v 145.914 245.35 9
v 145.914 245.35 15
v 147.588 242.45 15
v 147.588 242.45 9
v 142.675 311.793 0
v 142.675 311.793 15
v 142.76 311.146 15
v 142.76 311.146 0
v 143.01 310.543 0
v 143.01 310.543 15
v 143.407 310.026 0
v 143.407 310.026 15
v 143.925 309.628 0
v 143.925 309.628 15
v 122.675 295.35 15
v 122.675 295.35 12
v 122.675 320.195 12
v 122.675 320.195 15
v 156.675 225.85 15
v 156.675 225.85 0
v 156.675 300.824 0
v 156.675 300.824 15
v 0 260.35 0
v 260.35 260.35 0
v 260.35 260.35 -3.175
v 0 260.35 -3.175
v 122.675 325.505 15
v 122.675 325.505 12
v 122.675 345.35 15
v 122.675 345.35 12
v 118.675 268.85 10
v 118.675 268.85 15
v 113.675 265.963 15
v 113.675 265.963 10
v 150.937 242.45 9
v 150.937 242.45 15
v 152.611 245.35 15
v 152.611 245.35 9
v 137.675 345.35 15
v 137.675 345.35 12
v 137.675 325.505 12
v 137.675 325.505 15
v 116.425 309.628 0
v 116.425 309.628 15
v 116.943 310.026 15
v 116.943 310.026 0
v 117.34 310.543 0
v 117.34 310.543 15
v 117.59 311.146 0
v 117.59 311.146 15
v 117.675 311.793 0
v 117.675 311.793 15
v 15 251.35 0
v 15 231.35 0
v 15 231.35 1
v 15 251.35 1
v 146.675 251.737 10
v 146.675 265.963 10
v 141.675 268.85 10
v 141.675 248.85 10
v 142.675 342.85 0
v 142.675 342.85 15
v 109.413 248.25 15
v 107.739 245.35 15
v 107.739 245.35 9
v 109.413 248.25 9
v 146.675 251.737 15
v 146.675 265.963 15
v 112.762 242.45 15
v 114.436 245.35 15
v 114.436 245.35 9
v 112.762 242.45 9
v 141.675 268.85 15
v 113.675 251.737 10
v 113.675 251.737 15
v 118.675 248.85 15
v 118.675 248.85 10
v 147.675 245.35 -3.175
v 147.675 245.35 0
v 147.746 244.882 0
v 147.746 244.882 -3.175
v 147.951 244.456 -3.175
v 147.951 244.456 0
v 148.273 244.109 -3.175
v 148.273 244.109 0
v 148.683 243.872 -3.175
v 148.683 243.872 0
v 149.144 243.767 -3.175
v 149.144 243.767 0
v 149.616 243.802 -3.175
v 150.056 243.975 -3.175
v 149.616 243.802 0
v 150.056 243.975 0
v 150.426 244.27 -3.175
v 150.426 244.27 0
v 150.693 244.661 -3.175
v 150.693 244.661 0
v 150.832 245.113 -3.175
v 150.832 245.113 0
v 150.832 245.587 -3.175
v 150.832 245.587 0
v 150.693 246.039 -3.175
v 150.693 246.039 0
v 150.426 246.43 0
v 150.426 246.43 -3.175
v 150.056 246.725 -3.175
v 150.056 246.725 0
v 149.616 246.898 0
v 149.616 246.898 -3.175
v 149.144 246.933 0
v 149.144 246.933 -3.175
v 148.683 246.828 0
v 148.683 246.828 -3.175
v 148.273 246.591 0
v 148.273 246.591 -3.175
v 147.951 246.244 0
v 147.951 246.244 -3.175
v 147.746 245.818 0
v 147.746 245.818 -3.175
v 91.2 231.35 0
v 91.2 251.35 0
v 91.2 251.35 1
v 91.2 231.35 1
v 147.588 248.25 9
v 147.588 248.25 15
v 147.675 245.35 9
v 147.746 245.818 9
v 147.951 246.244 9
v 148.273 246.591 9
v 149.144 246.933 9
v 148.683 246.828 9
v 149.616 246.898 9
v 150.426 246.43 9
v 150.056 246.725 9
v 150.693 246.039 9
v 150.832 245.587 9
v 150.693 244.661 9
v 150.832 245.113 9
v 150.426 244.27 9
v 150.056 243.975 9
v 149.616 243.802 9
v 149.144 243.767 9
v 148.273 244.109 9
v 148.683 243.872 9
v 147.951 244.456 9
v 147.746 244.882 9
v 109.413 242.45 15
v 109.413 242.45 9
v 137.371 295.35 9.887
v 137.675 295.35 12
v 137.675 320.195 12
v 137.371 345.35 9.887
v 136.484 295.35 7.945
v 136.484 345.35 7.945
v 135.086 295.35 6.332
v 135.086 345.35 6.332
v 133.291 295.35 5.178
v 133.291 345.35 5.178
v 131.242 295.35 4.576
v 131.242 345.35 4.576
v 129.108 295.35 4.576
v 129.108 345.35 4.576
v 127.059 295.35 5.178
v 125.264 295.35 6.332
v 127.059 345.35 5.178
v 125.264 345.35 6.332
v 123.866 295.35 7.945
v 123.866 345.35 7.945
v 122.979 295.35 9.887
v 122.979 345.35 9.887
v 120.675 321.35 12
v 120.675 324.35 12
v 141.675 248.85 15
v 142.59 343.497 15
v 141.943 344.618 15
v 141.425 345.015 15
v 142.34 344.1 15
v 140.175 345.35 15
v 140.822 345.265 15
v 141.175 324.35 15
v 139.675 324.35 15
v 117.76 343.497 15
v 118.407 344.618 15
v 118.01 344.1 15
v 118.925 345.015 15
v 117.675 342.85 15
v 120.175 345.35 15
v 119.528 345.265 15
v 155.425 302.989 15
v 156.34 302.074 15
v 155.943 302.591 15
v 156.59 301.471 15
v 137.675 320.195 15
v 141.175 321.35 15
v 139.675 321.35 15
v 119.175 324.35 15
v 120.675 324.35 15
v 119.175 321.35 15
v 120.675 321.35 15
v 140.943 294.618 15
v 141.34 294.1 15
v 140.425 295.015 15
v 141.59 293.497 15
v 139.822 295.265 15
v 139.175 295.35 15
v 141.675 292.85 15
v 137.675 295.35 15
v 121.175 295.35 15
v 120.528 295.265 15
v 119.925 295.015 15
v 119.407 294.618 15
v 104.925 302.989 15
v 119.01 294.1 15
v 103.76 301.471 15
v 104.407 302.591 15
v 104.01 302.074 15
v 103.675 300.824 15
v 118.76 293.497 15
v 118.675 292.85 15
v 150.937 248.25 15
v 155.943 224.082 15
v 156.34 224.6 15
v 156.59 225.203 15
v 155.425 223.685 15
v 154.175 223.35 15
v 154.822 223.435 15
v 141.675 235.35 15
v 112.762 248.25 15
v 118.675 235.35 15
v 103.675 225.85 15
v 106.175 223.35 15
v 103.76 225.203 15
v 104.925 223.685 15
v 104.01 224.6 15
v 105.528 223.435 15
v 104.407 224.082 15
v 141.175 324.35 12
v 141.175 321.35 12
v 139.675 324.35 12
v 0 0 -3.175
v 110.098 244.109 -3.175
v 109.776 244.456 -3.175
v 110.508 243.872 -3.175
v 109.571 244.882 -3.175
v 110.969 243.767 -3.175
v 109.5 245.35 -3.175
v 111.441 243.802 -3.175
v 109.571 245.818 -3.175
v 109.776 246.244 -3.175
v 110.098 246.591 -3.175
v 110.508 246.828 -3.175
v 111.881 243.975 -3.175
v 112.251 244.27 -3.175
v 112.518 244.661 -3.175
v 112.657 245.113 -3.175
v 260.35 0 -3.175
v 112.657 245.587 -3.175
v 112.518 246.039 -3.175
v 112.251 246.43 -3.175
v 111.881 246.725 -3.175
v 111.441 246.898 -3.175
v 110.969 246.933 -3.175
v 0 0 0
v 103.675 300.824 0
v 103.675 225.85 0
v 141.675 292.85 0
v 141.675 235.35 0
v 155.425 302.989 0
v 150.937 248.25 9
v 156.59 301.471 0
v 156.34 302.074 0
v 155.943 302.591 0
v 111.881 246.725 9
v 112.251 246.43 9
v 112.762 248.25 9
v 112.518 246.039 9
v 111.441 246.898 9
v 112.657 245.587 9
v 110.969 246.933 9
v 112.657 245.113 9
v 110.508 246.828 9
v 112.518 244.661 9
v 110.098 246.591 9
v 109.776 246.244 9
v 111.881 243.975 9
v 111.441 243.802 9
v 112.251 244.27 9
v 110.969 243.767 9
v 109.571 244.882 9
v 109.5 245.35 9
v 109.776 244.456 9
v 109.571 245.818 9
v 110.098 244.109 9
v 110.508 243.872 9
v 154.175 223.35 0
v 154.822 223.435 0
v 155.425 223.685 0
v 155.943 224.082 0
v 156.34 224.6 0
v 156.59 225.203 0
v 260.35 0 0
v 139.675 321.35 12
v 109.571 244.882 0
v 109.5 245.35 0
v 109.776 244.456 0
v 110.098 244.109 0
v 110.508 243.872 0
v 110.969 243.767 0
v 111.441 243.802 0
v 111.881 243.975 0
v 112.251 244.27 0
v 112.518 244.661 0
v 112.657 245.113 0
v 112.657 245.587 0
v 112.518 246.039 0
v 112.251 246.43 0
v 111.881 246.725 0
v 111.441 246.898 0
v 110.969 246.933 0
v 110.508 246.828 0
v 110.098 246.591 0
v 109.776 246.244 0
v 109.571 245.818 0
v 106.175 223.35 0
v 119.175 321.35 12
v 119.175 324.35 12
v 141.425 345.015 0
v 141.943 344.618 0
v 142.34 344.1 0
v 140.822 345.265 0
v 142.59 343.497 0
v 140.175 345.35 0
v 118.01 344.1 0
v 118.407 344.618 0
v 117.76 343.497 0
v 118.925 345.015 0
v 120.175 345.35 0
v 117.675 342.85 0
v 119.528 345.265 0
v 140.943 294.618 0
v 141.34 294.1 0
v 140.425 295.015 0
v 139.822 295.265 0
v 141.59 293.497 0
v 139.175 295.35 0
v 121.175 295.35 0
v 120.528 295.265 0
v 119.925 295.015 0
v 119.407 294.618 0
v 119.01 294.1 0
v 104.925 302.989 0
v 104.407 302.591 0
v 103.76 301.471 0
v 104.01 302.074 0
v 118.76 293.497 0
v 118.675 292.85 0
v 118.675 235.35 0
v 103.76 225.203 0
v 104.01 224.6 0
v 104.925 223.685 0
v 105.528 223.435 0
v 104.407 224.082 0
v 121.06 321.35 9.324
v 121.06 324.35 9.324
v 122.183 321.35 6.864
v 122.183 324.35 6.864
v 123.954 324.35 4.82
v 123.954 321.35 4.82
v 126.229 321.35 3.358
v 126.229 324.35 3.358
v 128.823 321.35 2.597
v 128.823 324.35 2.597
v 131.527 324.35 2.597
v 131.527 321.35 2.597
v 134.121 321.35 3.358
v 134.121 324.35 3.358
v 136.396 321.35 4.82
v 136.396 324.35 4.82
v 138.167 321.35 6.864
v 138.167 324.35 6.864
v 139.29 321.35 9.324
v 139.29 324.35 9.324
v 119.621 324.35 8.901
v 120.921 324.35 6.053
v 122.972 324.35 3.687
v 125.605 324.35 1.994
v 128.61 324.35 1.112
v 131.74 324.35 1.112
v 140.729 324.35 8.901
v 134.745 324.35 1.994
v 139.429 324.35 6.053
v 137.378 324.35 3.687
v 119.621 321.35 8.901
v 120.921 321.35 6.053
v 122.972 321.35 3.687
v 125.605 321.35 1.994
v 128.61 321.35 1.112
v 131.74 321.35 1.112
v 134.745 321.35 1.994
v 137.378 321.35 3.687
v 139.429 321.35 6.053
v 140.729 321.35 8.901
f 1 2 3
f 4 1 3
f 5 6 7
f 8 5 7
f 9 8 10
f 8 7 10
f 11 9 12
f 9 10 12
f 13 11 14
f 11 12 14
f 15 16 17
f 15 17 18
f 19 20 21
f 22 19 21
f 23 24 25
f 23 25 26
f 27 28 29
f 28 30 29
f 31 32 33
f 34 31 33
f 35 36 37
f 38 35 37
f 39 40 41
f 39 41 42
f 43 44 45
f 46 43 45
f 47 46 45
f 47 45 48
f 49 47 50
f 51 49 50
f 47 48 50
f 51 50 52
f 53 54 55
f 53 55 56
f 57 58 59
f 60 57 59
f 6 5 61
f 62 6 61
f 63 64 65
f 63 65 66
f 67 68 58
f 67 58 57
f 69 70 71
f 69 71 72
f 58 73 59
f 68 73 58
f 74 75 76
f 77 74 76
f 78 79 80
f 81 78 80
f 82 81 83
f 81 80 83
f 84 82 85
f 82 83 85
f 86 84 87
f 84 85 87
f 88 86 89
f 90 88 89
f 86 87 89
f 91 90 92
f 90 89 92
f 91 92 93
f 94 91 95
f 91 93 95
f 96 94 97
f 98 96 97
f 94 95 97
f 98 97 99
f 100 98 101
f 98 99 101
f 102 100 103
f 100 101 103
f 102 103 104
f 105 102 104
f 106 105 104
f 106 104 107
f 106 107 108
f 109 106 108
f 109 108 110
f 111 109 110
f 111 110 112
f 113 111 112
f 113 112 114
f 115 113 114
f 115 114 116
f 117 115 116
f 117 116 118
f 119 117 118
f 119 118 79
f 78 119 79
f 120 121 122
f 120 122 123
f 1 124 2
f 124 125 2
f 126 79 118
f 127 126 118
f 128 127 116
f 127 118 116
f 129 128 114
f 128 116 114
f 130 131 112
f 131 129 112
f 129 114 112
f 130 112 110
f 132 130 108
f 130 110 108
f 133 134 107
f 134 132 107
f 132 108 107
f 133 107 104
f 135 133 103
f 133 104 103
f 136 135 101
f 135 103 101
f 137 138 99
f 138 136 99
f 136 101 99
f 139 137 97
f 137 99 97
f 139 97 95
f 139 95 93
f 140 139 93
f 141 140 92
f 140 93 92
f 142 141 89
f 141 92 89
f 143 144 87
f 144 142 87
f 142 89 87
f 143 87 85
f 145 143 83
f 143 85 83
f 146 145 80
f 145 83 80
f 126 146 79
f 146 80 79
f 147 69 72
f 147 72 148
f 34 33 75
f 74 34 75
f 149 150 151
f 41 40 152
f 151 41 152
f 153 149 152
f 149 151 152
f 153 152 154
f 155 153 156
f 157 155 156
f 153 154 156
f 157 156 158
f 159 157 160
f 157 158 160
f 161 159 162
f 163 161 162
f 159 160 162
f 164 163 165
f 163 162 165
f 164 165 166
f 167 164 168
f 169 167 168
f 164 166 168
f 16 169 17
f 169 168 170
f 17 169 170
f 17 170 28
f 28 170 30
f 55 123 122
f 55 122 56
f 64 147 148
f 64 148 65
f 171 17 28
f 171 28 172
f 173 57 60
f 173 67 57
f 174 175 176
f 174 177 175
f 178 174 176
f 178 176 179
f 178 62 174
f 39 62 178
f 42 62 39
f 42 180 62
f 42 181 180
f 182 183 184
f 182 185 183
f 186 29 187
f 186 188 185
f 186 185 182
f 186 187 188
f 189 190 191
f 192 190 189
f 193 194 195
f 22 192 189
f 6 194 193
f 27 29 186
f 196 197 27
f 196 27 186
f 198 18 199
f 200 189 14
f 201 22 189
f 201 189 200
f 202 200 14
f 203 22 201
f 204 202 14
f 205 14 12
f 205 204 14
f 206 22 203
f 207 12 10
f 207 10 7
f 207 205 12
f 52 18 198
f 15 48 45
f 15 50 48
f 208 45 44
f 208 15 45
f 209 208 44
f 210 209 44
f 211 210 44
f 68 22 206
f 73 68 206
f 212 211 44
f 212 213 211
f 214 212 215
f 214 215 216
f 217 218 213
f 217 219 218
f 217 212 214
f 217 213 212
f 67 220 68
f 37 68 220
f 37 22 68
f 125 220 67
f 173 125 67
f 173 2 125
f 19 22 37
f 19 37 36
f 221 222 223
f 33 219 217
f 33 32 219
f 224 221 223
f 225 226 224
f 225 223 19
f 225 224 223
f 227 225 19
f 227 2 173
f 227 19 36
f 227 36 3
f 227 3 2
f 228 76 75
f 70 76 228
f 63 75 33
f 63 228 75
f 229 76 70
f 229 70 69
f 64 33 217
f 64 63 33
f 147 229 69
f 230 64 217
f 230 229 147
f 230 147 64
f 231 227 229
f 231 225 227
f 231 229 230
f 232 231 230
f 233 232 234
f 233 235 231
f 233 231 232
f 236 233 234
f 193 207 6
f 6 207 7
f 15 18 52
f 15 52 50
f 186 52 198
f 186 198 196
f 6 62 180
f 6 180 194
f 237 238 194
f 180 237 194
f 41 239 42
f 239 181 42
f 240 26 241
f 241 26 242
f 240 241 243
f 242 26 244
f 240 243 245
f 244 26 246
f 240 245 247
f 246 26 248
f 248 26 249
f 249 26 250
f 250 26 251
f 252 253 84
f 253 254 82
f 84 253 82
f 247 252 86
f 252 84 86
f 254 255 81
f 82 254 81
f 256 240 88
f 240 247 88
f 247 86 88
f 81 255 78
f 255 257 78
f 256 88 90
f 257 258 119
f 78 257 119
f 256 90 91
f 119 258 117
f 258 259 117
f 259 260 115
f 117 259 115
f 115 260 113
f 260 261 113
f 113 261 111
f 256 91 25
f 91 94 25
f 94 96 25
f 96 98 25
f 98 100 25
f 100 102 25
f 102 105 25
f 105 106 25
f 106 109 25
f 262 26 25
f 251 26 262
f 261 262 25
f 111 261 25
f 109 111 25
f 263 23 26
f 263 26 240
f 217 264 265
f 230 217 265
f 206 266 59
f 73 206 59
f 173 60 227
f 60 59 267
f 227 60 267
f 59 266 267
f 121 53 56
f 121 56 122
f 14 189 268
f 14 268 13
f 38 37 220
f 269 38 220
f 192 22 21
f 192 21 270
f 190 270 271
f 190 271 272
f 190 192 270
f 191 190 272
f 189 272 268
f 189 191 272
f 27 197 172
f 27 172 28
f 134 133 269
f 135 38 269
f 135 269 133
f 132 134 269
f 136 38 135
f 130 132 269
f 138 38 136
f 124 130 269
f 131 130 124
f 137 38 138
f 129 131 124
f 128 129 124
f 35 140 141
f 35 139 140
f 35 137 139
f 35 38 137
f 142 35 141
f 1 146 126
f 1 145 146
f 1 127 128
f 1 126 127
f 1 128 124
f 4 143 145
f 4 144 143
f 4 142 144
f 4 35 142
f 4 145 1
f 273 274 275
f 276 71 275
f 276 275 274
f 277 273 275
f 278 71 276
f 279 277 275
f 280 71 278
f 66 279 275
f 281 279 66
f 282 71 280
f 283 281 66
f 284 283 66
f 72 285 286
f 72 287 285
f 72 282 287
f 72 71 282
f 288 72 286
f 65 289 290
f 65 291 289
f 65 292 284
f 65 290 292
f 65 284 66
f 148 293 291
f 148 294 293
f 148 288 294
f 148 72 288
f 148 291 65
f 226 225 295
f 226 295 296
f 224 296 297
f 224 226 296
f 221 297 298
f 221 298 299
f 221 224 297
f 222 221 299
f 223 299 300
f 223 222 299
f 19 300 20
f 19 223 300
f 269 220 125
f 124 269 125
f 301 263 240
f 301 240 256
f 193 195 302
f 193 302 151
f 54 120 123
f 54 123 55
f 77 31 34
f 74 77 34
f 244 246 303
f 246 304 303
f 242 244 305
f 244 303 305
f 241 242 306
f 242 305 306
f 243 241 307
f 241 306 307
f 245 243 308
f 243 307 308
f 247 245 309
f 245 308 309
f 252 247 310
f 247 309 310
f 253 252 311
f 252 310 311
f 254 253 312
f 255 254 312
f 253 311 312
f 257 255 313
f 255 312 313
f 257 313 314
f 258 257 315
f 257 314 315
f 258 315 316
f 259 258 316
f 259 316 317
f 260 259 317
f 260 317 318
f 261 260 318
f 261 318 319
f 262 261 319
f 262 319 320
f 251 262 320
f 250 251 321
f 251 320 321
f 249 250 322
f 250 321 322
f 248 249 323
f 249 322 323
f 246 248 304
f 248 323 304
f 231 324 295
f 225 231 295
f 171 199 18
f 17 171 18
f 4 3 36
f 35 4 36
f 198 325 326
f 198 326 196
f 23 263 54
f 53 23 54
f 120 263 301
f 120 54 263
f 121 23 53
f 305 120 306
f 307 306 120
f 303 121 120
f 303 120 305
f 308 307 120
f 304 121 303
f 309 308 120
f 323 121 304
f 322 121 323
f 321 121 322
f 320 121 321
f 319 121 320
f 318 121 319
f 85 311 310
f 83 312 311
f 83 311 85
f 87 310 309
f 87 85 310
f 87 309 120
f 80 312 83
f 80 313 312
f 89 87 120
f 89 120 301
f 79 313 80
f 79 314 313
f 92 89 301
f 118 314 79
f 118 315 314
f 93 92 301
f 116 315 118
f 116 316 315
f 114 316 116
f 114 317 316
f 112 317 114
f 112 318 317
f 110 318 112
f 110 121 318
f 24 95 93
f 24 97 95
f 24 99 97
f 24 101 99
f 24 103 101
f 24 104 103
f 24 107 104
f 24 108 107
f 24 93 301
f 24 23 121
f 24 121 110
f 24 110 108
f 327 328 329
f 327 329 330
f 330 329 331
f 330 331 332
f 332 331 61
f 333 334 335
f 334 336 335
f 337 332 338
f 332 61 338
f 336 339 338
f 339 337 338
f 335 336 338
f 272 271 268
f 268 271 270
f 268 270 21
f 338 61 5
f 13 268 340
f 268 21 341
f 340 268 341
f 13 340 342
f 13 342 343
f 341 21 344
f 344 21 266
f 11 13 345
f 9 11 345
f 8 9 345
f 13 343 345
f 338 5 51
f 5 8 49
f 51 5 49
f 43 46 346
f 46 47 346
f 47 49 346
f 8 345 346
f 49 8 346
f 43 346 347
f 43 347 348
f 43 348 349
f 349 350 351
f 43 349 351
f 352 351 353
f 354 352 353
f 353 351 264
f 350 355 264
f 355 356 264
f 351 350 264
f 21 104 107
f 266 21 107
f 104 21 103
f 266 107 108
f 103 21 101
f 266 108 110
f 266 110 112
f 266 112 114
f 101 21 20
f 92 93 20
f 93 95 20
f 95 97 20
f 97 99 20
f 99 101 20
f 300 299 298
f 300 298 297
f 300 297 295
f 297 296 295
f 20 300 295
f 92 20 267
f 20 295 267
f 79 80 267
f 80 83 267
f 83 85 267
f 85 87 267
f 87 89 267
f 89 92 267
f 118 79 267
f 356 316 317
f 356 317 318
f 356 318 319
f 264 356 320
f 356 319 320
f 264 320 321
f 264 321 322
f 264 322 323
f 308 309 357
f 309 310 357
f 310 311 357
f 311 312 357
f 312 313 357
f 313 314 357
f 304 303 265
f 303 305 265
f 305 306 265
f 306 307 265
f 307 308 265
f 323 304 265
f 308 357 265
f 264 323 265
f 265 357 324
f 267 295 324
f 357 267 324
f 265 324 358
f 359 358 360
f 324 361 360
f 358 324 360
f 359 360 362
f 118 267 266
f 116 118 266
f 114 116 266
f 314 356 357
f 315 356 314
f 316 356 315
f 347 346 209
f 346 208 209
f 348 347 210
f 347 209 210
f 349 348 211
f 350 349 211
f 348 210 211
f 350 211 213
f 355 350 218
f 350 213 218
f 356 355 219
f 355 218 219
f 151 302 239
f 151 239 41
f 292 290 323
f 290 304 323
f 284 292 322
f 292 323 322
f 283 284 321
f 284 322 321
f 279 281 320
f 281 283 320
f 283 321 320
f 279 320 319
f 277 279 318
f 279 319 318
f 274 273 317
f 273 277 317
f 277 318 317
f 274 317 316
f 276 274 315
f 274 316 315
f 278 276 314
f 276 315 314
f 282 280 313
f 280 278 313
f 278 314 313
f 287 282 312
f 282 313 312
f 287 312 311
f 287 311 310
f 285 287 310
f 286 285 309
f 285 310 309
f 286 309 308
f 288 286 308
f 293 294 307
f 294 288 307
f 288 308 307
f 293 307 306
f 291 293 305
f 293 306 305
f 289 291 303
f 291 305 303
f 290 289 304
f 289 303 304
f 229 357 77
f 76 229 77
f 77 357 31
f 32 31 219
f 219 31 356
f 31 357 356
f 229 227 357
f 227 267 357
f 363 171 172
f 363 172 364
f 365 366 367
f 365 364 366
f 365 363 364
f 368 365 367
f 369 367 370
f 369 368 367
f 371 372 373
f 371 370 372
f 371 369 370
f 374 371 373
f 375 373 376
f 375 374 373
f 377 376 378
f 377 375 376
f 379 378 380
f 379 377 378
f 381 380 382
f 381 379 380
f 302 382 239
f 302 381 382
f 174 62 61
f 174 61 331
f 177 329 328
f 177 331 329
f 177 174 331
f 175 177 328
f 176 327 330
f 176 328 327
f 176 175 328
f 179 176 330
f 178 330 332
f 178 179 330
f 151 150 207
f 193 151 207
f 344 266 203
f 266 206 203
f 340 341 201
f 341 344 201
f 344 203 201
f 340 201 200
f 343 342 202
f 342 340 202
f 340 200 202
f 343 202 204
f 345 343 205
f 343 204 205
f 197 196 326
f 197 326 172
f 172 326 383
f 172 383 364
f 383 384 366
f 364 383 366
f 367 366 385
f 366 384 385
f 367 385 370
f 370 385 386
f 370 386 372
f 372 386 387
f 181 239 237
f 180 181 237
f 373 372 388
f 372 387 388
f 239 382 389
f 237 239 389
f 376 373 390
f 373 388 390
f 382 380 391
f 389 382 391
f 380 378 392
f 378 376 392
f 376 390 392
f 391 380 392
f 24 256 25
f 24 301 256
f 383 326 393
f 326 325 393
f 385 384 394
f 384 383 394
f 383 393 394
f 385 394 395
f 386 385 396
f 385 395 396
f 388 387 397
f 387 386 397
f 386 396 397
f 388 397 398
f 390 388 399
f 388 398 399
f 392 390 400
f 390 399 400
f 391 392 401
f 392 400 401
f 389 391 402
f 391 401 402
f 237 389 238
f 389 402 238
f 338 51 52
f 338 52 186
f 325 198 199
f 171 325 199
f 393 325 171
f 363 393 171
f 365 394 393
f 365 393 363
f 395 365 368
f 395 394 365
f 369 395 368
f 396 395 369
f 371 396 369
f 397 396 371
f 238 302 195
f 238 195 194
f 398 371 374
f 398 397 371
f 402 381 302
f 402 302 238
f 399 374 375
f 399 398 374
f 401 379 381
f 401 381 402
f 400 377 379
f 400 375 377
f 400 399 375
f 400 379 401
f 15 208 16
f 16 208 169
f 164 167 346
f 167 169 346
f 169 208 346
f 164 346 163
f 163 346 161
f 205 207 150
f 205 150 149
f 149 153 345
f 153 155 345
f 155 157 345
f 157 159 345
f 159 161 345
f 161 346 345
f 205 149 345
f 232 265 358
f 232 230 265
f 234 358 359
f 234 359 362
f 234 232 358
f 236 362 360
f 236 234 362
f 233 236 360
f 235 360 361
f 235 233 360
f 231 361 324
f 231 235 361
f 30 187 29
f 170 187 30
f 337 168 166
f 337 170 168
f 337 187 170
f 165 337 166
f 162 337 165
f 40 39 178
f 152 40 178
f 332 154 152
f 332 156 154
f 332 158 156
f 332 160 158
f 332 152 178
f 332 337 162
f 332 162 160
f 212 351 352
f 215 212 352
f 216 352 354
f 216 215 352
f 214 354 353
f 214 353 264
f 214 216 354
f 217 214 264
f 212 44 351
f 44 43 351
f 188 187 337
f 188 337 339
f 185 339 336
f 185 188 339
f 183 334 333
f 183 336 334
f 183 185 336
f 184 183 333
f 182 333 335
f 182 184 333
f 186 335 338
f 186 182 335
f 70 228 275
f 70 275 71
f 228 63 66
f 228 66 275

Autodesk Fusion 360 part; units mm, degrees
sketch "Sketch1" plane through (0, 0, 0) normal (0, 0, 1) x (1, 0, 0) in component "BedPlate"
  line L0 (0, 0) -> (260.35, 0)
  line L1 (260.35, 0) -> (260.35, 260.35)
  line L2 (260.35, 260.35) -> (0, 260.35)
  line L3 (0, 260.35) -> (0, 0)
  dimension "d1" = 260.35
  dimension "d2" = 260.35
extrude "Extrude1" add sketch "Sketch1" against normal blind 3.175 makes body 1 in component "BedPlate"
sketch "Sketch2" plane through (0, 0, 0) normal (0, 0, 1) x (-1, 0, 0) in component "BedPlate"
  circle A0 centre (-111.0875, -245.35) radius 1.5875
  circle A1 centre (-149.2625, -245.35) radius 1.5875
  line L0 (-118.675, -245.35) -> (-141.675, -245.35) construction
  line L1 (-260.35, -260.35) -> (0, -260.35)
  line L2 (-130.175, -260.35) -> (-130.175, -245.35) construction
  line L3 (-112.675, -245.35) -> (-147.675, -245.35)
  line L4 (-118.675, -245.35) -> (-118.675, -260.35) construction
  line L5 (-141.675, -245.35) -> (-141.675, -260.35) construction
  dimension "d5" = 23
  dimension "d7" = 3.175
  dimension "d8" = 3.175
  dimension "d9" = 6
  dimension "d10" = 15
extrude "Extrude2" cut sketch "Sketch2" against normal through all bodies 1 in component "BedPlate"
sketch "Sketch1 (2)" plane through (0, 0, 0) normal (0, 0, 1) x (-1, 0, 0) in component "WireSupportBracket"
  line L0 (-103.675, -302.2671) -> (-103.675, -223.35)
  line L1 (-103.675, -223.35) -> (-156.675, -223.35)
  line L2 (-156.675, -223.35) -> (-156.675, -302.2671)
  line L3 (-141.675, -295.35) -> (-141.675, -235.35)
  line L4 (-141.675, -235.35) -> (-118.675, -235.35)
  line L5 (-118.675, -235.35) -> (-118.675, -295.35)
  circle A0 centre (-149.2625, -245.35) radius 1.5875
  circle A1 centre (-111.0875, -245.35) radius 1.5875
  line L6 (-149.2625, -245.35) -> (-111.0875, -245.35) construction
  line L7 (-130.175, -356.4968) -> (-130.175, -223.35) construction
  line L8 (-260.35, -260.35) -> (0, -260.35) construction
  line L9 (-118.675, -295.35) -> (-141.675, -295.35)
  line L10 (-122.675, -345.35) -> (-122.675, -295.35)
  line L11 (-137.675, -295.35) -> (-137.675, -345.35)
  line L12 (-117.675, -310.35) -> (-103.675, -302.2671)
  line L13 (-156.675, -302.2671) -> (-142.675, -310.35)
  line L14 (-117.675, -310.35) -> (-117.675, -345.35)
  line L15 (-142.675, -310.35) -> (-142.675, -345.35)
  line L16 (-122.675, -313.5082) -> (-137.675, -313.5082) construction
  line L17 (-117.675, -345.35) -> (-142.675, -345.35)
  line L18 (-145.9139, -245.35) -> (-147.5882, -242.45)
  line L19 (-147.5882, -242.45) -> (-150.9368, -242.45)
  line L20 (-150.9368, -242.45) -> (-152.6111, -245.35)
  line L21 (-152.6111, -245.35) -> (-150.9368, -248.25)
  line L22 (-150.9368, -248.25) -> (-147.5882, -248.25)
  line L23 (-147.5882, -248.25) -> (-145.9139, -245.35)
  line L24 (-114.4361, -245.35) -> (-112.7618, -242.45)
  line L25 (-112.7618, -242.45) -> (-109.4132, -242.45)
  line L26 (-109.4132, -242.45) -> (-107.7389, -245.35)
  line L27 (-107.7389, -245.35) -> (-109.4132, -248.25)
  line L28 (-109.4132, -248.25) -> (-112.7618, -248.25)
  line L29 (-112.7618, -248.25) -> (-114.4361, -245.35)
  point P0 (0, 0.0158)
  dimension "d12" = 23
  dimension "d14" = 25
  dimension "d15" = 12
  dimension "d16" = 15
  dimension "d18" = 15
  dimension "d19" = 50
  dimension "d20" = 15
  dimension "d21" = 60
  dimension "d22" = 15
  dimension "d23" = 5
  dimension "d25" = 50
  dimension "d26" = 5.8
extrude "Extrude1'" add sketch "Sketch1 (2)" along normal blind 15 separate body contours L0 L1 L2 L3 L4 L5 L9 L10 L11 L12 L13 L14 L15 L17 | L9 L10 L11 L17 | L18 L19 L20 L21 L22 L23 | L24 L25 L26 L27 L28 L29 makes body 2 in component "WireSupportBracket"
extrude "Extrude2'" cut sketch "Sketch1 (2)" against normal blind 6 from surface at 15 contours L18 L19 L20 L21 L22 L23 | L24 L25 L26 L27 L28 L29 bodies 2 in component "WireSupportBracket"
sketch "Sketch2 (2)" plane through (0, 345.35, 0) normal (0, 1, 0) x (-1, 0, 0) in component "WireSupportBracket"
  circle A0 centre (-130.175, 12) radius 7.5
  line L0 (-122.675, 0) -> (-122.675, 19.5)
  line L1 (-137.675, 0) -> (-137.675, 19.5)
  line L2 (-137.675, 19.5) -> (-122.675, 19.5)
  line L3 (-117.675, 0) -> (-142.675, 0) construction
  dimension "d32" = 12
extrude "Extrude3" cut sketch "Sketch2 (2)" against normal up to surface (50 mm away) bodies 2 in component "WireSupportBracket"
ref_plane "WorkPlane1" through (130.175, 321.35, 7.5) normal (0, 1, 0) x (-1, 0, 0) in component "WireSupportBracket"
sketch "Sketch3" plane through (130.175, 321.35, 7.5) normal (0, 1, 0) x (1, 0, 0) in component "WireSupportBracket"
  arc A0 (7.5, -4.5) -> (-7.5, -4.5) centre (0, -4.5) ccw
  line L0 (7.5, -4.5) -> (7.5, -7.5)
  line L1 (-7.5, -4.5) -> (-7.5, -7.5)
  line L2 (-9.5, -4.5) -> (-9.5, -7.5)
  arc A1 (9.5, -4.5) -> (-9.5, -4.5) centre (0, -4.5) ccw
  line L3 (9.5, -4.5) -> (9.5, -7.5)
  line L4 (11, -4.5) -> (11, -7.5)
  arc A2 (11, -4.5) -> (-11, -4.5) centre (0, -4.5) ccw
  line L5 (-11, -4.5) -> (-11, -7.5)
  line L6 (-9.5, -7.5) -> (-11, -7.5)
  line L7 (11, -7.5) -> (9.5, -7.5)
  line L8 (11.5, -7.5) -> (-11.5, -7.5)
  dimension "d36" = 2
  dimension "d38" = 3.5
extrude "Extrude4" cut sketch "Sketch3" along normal blind 3 contours L2 A1 L3 L4 A2 L5 L6 L7 L8 bodies 2 in component "WireSupportBracket"
fillet "Fillet1" radius 2.5 10 edges at (156.675, 223.35, 7.5) (156.675, 302.2671, 7.5) (142.675, 310.35, 7.5) (142.675, 345.35, 7.5) (117.675, 345.35, 7.5) (117.675, 310.35, 7.5) (103.675, 302.2671, 7.5) (103.675, 223.35, 7.5) (141.675, 295.35, 7.5) (118.675, 295.35, 7.5) on bodies 2 in component "WireSupportBracket"
sketch "Sketch3 (2)" plane through (0, 0, 0) normal (0, 0, 1) x (-1, 0, 0) in component "BedPlate"
  line L0 (-15, -251.35) -> (-91.2, -251.35)
  line L1 (-91.2, -251.35) -> (-91.2, -231.35)
  line L2 (-91.2, -231.35) -> (-15, -231.35)
  line L3 (-15, -231.35) -> (-15, -251.35)
  line L4 (0, -260.35) -> (0, 0)
  line L5 (-260.35, -260.35) -> (0, -260.35)
  dimension "d42" = 76.2
  dimension "d43" = 20
  dimension "d44" = 15
  dimension "d45" = 9
extrude "Extrude3'" add sketch "Sketch3 (2)" along normal blind 1 bodies 1 in component "BedPlate"
sketch "Sketch4" plane through (0, 0, 15) normal (0, 0, 1) x (-1, 0, 0) in component "WireSupportBracket"
  line L0 (-141.675, -268.85) -> (-146.675, -265.9632)
  line L1 (-146.675, -265.9632) -> (-146.675, -251.7368)
  line L2 (-146.675, -251.7368) -> (-141.675, -248.85)
  line L3 (-106.175, -223.35) -> (-154.175, -223.35)
  line L4 (-141.675, -292.85) -> (-141.675, -235.35)
  line L5 (-130.175, -223.35) -> (-130.175, -293.582) construction
  line L6 (-146.675, -258.85) -> (-141.675, -258.85) construction
  line L7 (-118.675, -268.85) -> (-113.675, -265.9632)
  line L8 (-113.675, -265.9632) -> (-113.675, -251.7368)
  line L9 (-113.675, -251.7368) -> (-118.675, -248.85)
  line L10 (-118.675, -235.35) -> (-118.675, -292.85)
  line L11 (-141.175, -321.35) -> (-139.675, -321.35)
  line L12 (-139.675, -324.35) -> (-141.175, -324.35)
  line L13 (-137.675, -345.35) -> (-137.675, -295.35)
  line L14 (-139.675, -321.35) -> (-137.675, -320.1953)
  line L15 (-139.675, -324.35) -> (-137.675, -325.5047)
  line L16 (-137.675, -322.85) -> (-139.675, -322.85) construction
  line L17 (-139.675, -321.35) -> (-139.675, -324.35)
  line L18 (-120.675, -321.35) -> (-122.675, -320.1953)
  line L19 (-120.675, -324.35) -> (-122.675, -325.5047)
  line L20 (-120.675, -321.35) -> (-120.675, -324.35)
  line L21 (-122.675, -295.35) -> (-122.675, -345.35)
  dimension "d48" = 24
  dimension "d49" = 5
  dimension "d50" = 20
  dimension "d51" = 60
  dimension "d52" = 60
extrude "Extrude5" cut sketch "Sketch4" against normal blind 3 contours L13 L14 L15 L17 | L18 L19 L20 L21 bodies 2 in component "WireSupportBracket"
extrude "Extrude6" cut sketch "Sketch4" against normal blind 5 contours L0 L1 L2 L4 | L7 L8 L9 L10 bodies 2 in component "WireSupportBracket"
component "BedPlate" placed x (1, 0, 0) y (0, 1, 0) z (0, 0, 1) at (0, 0, 0)
component "WireSupportBracket" placed x (1, 0, 0) y (0, 1, 0) z (0, 0, 1) at (0, 0, 0)
equation "d8 = d7"
